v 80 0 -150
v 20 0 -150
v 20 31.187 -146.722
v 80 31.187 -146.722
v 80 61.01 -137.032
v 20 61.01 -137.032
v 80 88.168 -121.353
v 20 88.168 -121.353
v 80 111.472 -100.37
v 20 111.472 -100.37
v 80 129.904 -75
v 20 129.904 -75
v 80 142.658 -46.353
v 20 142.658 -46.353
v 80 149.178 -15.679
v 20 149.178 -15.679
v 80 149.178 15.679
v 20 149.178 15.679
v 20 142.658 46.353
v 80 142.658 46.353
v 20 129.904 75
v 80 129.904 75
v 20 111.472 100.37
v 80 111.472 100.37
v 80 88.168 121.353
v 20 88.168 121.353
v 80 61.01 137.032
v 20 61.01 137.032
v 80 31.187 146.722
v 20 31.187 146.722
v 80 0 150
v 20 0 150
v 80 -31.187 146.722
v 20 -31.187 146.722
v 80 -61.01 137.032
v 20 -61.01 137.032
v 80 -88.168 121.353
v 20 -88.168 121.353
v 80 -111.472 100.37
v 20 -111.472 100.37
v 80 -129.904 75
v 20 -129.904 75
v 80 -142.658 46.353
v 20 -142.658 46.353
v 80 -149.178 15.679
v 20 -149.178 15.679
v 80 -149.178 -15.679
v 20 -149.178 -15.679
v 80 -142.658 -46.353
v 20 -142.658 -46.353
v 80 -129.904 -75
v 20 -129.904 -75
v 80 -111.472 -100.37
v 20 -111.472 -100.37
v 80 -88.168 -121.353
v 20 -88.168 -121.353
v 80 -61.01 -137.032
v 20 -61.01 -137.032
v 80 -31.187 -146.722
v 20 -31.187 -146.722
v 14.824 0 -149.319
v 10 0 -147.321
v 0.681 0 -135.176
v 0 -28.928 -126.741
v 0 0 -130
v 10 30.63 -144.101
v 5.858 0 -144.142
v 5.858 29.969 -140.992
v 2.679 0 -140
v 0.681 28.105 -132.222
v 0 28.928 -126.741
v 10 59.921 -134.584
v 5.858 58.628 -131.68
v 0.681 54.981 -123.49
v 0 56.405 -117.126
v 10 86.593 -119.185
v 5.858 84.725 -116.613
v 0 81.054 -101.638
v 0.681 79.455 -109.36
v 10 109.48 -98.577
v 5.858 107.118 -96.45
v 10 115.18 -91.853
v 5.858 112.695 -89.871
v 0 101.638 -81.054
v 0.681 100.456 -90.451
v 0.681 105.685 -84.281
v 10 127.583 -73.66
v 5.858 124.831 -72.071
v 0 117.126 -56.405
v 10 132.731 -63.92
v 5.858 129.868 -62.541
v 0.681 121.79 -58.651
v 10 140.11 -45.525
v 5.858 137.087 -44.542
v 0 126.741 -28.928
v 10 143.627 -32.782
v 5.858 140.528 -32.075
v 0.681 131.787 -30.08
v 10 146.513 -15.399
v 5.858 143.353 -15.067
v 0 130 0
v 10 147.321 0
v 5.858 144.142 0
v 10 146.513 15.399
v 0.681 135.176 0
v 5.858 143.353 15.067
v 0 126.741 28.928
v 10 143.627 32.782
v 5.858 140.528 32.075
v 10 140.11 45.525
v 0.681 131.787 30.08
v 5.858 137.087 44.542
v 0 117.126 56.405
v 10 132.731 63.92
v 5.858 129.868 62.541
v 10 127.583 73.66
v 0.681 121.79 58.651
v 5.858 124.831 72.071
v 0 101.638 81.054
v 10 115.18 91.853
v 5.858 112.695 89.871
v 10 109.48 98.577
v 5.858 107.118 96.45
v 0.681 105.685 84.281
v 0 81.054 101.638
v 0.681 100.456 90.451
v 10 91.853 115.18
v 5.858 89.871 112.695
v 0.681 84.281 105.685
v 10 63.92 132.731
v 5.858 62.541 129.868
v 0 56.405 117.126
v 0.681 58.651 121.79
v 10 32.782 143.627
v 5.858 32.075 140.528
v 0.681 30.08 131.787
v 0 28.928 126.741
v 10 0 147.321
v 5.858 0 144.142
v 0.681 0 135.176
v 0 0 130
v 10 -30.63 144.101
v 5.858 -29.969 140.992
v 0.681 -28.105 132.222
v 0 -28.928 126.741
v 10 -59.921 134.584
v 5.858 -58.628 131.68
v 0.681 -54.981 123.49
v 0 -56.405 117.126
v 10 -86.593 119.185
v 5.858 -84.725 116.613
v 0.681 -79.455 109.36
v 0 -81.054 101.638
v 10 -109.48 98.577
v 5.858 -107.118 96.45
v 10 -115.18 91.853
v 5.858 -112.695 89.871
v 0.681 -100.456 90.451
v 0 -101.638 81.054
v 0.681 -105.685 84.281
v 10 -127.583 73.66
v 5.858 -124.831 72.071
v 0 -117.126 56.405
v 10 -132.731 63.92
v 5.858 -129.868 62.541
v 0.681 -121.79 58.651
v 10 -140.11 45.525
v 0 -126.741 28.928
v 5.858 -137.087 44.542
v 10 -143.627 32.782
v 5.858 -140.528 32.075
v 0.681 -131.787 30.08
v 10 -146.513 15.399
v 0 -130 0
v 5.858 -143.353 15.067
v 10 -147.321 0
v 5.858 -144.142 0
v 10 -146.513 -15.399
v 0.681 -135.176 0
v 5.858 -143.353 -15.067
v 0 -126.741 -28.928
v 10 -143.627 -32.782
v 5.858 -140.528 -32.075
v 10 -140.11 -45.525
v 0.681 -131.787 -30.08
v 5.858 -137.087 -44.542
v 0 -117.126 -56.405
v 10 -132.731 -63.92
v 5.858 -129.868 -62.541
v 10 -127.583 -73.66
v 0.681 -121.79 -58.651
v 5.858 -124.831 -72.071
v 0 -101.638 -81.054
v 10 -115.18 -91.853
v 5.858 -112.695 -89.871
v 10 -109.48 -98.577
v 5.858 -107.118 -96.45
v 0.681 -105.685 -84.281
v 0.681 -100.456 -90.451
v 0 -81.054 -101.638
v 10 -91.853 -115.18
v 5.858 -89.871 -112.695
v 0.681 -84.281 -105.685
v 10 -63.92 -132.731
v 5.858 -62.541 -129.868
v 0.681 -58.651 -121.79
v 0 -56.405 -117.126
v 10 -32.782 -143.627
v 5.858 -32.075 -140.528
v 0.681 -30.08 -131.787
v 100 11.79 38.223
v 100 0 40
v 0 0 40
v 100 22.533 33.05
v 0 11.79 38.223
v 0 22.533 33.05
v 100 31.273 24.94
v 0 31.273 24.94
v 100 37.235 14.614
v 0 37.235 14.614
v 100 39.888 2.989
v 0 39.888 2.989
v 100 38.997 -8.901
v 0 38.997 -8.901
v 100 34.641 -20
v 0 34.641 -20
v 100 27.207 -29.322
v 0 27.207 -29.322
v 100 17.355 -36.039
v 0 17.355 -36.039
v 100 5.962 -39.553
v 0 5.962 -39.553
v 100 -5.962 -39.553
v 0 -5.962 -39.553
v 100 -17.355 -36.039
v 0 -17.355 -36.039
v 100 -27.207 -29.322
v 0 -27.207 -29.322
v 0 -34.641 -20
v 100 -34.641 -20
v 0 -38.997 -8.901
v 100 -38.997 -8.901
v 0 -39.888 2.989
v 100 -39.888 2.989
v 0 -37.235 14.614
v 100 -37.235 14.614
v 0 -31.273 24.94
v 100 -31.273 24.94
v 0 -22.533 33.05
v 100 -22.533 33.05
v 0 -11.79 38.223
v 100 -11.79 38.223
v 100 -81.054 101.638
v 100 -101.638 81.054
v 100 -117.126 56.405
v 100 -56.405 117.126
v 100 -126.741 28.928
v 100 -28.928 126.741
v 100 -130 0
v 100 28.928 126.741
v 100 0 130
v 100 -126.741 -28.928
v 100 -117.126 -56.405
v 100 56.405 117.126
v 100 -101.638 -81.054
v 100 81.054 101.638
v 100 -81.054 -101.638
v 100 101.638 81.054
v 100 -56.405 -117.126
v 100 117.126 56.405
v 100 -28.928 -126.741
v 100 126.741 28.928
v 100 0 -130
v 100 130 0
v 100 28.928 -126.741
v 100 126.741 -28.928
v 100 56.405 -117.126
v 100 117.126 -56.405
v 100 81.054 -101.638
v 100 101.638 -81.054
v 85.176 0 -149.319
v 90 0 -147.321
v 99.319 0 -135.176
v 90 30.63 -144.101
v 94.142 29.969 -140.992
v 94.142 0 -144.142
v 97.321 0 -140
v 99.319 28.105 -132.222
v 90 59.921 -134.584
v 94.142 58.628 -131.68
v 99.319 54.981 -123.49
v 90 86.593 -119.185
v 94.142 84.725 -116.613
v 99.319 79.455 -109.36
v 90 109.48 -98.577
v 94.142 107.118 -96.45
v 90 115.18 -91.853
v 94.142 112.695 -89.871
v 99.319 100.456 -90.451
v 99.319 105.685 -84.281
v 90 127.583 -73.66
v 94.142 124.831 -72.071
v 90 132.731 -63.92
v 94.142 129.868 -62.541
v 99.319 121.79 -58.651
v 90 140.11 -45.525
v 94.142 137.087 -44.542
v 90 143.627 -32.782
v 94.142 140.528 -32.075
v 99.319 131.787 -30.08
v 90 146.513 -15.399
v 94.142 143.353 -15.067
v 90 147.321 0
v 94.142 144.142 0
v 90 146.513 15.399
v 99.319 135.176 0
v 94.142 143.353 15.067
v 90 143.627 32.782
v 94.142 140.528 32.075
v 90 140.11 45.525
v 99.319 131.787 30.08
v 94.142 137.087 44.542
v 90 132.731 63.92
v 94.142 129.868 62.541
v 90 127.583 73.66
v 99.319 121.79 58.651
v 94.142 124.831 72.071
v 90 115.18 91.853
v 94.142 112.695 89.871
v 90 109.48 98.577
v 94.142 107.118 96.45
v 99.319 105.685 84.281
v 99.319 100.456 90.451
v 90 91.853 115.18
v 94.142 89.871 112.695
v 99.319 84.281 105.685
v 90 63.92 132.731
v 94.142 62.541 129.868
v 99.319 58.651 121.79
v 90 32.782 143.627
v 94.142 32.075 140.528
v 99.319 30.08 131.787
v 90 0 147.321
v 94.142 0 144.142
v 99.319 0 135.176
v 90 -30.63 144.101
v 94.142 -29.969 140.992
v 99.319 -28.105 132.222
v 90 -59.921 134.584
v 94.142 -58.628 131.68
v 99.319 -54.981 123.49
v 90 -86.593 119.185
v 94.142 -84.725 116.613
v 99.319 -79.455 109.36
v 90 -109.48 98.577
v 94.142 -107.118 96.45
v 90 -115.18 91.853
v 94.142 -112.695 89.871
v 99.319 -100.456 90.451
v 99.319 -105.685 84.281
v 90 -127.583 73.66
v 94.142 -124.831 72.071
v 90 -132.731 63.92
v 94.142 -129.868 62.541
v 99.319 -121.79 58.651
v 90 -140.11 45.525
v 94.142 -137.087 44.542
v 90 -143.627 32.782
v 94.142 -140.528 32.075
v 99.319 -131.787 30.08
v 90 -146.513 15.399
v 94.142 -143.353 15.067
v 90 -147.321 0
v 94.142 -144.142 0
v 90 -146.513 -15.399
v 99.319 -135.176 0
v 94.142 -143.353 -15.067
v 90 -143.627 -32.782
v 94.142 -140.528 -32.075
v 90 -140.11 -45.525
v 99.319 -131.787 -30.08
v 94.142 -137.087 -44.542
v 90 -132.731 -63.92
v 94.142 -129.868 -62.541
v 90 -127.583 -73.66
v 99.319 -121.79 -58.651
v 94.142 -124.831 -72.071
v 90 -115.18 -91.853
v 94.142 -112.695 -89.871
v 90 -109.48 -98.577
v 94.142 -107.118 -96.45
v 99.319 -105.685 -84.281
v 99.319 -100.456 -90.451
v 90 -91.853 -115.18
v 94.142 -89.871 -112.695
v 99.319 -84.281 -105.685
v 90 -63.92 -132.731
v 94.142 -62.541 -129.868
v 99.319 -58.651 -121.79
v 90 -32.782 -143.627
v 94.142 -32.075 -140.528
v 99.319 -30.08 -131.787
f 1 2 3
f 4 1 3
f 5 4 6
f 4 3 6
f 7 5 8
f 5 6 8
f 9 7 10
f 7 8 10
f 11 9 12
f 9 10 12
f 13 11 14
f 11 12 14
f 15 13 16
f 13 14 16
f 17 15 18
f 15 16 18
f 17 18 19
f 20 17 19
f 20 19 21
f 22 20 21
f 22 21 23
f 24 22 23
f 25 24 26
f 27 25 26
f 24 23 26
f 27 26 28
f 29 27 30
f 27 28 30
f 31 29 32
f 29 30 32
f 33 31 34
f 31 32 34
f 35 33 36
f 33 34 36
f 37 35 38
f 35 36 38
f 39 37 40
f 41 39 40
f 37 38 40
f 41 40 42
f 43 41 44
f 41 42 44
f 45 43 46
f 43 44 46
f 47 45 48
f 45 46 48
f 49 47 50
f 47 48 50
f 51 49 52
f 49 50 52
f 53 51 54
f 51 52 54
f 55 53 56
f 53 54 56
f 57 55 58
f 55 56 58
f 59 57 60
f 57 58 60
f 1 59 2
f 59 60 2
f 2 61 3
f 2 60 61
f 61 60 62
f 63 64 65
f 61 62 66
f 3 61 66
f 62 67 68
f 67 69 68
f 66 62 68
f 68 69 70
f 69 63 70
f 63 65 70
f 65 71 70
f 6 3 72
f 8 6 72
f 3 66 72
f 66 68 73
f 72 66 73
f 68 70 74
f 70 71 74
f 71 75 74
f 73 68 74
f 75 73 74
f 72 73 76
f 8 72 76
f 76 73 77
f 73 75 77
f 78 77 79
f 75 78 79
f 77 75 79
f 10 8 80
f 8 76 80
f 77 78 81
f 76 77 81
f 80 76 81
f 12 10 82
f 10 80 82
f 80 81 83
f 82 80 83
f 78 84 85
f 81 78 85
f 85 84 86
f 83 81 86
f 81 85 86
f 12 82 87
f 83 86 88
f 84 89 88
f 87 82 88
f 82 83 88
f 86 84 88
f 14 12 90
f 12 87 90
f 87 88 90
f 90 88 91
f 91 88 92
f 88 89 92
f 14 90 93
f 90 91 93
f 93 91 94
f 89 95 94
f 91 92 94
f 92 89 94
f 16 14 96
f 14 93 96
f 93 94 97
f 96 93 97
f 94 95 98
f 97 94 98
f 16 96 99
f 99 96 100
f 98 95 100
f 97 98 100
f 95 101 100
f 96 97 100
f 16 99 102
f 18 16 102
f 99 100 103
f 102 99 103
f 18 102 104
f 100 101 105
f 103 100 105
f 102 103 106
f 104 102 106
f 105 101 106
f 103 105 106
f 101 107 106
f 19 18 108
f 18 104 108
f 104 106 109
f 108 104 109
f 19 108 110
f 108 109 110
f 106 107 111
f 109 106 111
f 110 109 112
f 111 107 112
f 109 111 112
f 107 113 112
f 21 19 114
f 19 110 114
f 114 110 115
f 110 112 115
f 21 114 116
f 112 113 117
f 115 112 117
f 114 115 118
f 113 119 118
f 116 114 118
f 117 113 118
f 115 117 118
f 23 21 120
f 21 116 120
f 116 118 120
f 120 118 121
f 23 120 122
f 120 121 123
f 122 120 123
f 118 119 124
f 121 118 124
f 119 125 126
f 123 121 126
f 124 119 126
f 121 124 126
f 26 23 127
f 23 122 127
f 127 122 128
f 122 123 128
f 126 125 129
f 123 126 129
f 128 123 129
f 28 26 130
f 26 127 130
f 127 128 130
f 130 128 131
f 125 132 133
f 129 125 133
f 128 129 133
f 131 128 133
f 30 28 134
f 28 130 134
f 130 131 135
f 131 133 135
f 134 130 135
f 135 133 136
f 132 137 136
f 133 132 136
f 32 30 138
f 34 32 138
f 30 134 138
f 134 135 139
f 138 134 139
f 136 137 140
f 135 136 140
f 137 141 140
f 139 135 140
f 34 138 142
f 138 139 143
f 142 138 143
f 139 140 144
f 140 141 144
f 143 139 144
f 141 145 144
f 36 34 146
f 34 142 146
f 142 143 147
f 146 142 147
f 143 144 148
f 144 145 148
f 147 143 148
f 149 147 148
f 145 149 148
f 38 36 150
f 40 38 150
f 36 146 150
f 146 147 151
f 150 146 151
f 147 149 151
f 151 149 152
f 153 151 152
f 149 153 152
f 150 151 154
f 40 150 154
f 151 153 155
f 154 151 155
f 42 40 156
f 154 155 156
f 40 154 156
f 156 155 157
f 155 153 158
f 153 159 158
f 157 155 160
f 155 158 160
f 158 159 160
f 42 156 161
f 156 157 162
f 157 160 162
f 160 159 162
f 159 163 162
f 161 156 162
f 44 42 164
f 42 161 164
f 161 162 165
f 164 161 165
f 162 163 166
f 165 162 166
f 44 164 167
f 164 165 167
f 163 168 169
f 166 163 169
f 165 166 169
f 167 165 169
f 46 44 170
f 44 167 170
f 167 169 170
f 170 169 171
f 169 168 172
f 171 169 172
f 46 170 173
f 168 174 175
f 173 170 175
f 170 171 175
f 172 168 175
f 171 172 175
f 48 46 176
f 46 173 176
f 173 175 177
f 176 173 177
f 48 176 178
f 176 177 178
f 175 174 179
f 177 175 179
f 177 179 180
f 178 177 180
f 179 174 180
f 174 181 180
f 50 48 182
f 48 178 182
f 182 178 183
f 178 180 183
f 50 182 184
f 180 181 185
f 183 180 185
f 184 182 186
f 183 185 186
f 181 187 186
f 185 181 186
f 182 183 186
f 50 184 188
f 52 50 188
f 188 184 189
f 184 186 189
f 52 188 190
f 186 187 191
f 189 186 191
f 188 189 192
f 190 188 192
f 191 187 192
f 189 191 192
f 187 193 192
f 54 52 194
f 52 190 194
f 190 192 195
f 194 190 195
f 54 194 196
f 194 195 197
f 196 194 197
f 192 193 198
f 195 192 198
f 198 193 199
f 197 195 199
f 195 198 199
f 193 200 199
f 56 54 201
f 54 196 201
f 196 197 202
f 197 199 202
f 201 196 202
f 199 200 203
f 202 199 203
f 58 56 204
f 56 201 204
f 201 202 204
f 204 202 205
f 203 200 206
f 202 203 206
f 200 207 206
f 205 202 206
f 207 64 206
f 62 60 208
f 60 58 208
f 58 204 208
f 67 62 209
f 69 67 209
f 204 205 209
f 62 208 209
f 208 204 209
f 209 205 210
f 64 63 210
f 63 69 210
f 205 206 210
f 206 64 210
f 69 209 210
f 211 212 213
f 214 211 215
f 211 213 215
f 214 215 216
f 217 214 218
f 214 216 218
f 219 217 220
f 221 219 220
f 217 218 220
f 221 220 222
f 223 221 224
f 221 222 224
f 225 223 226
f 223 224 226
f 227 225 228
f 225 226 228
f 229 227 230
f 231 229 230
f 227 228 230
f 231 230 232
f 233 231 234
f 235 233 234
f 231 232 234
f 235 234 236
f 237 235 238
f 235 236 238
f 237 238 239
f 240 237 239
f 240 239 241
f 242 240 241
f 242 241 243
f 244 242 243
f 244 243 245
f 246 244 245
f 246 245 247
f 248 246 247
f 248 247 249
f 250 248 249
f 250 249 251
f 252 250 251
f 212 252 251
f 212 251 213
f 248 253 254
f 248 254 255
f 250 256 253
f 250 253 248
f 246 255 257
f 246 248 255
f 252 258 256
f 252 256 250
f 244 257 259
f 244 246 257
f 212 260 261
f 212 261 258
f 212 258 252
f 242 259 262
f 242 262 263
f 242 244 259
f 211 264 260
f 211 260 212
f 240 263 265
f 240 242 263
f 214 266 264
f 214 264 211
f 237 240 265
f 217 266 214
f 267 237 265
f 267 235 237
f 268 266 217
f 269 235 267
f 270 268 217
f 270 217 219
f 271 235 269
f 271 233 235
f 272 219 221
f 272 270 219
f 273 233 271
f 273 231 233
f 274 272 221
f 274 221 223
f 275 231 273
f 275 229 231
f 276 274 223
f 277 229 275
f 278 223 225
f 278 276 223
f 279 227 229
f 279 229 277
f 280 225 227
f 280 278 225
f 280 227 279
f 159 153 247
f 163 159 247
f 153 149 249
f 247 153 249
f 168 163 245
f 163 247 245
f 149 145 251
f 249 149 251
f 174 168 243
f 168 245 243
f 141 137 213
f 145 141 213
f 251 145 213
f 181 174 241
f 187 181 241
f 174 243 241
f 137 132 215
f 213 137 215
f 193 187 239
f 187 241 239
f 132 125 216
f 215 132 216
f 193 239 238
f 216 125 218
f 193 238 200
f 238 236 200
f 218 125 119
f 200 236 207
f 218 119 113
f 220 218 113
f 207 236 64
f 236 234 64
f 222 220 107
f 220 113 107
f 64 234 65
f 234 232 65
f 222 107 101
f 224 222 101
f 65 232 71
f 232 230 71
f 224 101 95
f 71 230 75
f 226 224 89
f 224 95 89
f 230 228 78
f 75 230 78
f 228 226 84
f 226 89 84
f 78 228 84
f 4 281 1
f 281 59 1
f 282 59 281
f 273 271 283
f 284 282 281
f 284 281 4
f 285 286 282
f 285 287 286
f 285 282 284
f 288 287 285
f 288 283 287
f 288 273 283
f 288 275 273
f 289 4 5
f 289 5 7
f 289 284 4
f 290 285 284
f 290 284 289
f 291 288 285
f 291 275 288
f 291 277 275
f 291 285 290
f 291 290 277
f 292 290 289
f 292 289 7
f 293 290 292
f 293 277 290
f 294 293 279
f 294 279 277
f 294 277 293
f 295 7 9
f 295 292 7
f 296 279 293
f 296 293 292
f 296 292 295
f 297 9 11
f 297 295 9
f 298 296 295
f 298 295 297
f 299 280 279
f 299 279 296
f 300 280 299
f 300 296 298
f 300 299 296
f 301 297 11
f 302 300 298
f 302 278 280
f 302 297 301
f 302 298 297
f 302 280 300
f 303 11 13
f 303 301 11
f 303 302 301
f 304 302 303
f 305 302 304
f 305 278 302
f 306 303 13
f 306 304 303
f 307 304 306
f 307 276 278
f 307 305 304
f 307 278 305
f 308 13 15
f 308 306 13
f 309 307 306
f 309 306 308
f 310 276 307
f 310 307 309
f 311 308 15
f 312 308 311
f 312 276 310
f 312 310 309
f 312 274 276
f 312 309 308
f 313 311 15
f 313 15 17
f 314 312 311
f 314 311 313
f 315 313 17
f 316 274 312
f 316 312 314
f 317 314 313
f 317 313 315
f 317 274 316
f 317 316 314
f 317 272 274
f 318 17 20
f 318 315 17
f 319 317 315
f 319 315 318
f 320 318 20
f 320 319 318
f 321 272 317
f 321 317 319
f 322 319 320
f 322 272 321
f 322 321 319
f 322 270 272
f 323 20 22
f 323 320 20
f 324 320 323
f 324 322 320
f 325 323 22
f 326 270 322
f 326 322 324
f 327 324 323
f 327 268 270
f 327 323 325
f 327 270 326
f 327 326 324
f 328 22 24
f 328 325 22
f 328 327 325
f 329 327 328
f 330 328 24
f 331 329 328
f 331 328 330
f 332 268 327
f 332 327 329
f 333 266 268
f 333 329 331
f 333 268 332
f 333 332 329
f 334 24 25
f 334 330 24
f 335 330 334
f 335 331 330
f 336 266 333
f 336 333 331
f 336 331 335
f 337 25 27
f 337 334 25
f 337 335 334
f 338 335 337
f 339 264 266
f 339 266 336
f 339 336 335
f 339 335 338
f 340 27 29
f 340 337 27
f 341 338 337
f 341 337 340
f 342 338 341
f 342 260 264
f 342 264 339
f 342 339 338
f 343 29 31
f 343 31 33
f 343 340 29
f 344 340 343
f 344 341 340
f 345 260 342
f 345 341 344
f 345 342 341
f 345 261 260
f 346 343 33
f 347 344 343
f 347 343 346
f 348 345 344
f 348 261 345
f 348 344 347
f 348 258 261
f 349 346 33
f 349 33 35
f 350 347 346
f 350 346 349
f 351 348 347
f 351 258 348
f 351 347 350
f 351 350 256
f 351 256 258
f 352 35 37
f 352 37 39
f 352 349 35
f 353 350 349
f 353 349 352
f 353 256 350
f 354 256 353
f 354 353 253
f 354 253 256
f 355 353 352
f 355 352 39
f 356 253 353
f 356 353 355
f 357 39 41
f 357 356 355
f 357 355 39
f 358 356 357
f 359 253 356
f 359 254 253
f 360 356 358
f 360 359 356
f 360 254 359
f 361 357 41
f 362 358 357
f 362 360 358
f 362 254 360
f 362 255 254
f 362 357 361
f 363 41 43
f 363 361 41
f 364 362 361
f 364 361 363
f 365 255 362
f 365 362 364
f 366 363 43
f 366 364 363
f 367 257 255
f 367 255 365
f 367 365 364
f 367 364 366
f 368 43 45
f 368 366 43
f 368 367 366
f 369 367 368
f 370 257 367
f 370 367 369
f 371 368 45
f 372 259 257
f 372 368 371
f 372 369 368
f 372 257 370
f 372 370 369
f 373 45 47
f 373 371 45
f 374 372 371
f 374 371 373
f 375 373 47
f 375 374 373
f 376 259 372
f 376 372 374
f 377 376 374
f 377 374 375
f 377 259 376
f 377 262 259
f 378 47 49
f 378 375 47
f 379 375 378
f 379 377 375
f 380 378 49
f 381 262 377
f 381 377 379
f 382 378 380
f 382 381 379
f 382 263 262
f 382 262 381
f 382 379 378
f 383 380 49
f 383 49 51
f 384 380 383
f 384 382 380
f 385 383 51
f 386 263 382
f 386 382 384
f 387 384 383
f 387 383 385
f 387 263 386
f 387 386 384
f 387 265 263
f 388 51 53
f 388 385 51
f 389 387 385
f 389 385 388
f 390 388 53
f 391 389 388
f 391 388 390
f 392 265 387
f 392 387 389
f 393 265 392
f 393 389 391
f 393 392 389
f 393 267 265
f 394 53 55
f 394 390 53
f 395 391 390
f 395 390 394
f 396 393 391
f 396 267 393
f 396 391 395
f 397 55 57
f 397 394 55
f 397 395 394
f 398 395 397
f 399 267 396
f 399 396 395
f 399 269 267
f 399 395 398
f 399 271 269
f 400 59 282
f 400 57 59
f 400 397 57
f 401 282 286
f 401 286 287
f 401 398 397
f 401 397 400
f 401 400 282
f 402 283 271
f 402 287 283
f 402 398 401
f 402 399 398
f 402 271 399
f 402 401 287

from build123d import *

# Parameters (mm, degrees)
SKETCH1_R           = 150
BOSS_EXTRUDE1_DEPTH = 100
FILLET1_R           = 20
SKETCH2_R           = 40
CUT_EXTRUDE1_DEPTH  = 101


with BuildPart() as part:
    # Sketch1 → Boss-Extrude1 (new body)
    with BuildSketch(Plane(origin=(0, 0, 0), x_dir=(0, 0, -1), z_dir=(1, 0, 0))):
        Circle(SKETCH1_R)
    extrude(amount=BOSS_EXTRUDE1_DEPTH)

    # Fillet1
    fillet1_edges = [part.edges().sort_by_distance(p)[0] for p in [
        (0, 0, 150),
        (100, 0, 150),
    ]]
    fillet(fillet1_edges, radius=FILLET1_R)

    # Sketch2 → Cut-Extrude1 (cut, through all)
    with BuildSketch(Plane.ZY):
        Circle(SKETCH2_R)
    extrude(amount=-CUT_EXTRUDE1_DEPTH, mode=Mode.SUBTRACT)


solid = part.part
